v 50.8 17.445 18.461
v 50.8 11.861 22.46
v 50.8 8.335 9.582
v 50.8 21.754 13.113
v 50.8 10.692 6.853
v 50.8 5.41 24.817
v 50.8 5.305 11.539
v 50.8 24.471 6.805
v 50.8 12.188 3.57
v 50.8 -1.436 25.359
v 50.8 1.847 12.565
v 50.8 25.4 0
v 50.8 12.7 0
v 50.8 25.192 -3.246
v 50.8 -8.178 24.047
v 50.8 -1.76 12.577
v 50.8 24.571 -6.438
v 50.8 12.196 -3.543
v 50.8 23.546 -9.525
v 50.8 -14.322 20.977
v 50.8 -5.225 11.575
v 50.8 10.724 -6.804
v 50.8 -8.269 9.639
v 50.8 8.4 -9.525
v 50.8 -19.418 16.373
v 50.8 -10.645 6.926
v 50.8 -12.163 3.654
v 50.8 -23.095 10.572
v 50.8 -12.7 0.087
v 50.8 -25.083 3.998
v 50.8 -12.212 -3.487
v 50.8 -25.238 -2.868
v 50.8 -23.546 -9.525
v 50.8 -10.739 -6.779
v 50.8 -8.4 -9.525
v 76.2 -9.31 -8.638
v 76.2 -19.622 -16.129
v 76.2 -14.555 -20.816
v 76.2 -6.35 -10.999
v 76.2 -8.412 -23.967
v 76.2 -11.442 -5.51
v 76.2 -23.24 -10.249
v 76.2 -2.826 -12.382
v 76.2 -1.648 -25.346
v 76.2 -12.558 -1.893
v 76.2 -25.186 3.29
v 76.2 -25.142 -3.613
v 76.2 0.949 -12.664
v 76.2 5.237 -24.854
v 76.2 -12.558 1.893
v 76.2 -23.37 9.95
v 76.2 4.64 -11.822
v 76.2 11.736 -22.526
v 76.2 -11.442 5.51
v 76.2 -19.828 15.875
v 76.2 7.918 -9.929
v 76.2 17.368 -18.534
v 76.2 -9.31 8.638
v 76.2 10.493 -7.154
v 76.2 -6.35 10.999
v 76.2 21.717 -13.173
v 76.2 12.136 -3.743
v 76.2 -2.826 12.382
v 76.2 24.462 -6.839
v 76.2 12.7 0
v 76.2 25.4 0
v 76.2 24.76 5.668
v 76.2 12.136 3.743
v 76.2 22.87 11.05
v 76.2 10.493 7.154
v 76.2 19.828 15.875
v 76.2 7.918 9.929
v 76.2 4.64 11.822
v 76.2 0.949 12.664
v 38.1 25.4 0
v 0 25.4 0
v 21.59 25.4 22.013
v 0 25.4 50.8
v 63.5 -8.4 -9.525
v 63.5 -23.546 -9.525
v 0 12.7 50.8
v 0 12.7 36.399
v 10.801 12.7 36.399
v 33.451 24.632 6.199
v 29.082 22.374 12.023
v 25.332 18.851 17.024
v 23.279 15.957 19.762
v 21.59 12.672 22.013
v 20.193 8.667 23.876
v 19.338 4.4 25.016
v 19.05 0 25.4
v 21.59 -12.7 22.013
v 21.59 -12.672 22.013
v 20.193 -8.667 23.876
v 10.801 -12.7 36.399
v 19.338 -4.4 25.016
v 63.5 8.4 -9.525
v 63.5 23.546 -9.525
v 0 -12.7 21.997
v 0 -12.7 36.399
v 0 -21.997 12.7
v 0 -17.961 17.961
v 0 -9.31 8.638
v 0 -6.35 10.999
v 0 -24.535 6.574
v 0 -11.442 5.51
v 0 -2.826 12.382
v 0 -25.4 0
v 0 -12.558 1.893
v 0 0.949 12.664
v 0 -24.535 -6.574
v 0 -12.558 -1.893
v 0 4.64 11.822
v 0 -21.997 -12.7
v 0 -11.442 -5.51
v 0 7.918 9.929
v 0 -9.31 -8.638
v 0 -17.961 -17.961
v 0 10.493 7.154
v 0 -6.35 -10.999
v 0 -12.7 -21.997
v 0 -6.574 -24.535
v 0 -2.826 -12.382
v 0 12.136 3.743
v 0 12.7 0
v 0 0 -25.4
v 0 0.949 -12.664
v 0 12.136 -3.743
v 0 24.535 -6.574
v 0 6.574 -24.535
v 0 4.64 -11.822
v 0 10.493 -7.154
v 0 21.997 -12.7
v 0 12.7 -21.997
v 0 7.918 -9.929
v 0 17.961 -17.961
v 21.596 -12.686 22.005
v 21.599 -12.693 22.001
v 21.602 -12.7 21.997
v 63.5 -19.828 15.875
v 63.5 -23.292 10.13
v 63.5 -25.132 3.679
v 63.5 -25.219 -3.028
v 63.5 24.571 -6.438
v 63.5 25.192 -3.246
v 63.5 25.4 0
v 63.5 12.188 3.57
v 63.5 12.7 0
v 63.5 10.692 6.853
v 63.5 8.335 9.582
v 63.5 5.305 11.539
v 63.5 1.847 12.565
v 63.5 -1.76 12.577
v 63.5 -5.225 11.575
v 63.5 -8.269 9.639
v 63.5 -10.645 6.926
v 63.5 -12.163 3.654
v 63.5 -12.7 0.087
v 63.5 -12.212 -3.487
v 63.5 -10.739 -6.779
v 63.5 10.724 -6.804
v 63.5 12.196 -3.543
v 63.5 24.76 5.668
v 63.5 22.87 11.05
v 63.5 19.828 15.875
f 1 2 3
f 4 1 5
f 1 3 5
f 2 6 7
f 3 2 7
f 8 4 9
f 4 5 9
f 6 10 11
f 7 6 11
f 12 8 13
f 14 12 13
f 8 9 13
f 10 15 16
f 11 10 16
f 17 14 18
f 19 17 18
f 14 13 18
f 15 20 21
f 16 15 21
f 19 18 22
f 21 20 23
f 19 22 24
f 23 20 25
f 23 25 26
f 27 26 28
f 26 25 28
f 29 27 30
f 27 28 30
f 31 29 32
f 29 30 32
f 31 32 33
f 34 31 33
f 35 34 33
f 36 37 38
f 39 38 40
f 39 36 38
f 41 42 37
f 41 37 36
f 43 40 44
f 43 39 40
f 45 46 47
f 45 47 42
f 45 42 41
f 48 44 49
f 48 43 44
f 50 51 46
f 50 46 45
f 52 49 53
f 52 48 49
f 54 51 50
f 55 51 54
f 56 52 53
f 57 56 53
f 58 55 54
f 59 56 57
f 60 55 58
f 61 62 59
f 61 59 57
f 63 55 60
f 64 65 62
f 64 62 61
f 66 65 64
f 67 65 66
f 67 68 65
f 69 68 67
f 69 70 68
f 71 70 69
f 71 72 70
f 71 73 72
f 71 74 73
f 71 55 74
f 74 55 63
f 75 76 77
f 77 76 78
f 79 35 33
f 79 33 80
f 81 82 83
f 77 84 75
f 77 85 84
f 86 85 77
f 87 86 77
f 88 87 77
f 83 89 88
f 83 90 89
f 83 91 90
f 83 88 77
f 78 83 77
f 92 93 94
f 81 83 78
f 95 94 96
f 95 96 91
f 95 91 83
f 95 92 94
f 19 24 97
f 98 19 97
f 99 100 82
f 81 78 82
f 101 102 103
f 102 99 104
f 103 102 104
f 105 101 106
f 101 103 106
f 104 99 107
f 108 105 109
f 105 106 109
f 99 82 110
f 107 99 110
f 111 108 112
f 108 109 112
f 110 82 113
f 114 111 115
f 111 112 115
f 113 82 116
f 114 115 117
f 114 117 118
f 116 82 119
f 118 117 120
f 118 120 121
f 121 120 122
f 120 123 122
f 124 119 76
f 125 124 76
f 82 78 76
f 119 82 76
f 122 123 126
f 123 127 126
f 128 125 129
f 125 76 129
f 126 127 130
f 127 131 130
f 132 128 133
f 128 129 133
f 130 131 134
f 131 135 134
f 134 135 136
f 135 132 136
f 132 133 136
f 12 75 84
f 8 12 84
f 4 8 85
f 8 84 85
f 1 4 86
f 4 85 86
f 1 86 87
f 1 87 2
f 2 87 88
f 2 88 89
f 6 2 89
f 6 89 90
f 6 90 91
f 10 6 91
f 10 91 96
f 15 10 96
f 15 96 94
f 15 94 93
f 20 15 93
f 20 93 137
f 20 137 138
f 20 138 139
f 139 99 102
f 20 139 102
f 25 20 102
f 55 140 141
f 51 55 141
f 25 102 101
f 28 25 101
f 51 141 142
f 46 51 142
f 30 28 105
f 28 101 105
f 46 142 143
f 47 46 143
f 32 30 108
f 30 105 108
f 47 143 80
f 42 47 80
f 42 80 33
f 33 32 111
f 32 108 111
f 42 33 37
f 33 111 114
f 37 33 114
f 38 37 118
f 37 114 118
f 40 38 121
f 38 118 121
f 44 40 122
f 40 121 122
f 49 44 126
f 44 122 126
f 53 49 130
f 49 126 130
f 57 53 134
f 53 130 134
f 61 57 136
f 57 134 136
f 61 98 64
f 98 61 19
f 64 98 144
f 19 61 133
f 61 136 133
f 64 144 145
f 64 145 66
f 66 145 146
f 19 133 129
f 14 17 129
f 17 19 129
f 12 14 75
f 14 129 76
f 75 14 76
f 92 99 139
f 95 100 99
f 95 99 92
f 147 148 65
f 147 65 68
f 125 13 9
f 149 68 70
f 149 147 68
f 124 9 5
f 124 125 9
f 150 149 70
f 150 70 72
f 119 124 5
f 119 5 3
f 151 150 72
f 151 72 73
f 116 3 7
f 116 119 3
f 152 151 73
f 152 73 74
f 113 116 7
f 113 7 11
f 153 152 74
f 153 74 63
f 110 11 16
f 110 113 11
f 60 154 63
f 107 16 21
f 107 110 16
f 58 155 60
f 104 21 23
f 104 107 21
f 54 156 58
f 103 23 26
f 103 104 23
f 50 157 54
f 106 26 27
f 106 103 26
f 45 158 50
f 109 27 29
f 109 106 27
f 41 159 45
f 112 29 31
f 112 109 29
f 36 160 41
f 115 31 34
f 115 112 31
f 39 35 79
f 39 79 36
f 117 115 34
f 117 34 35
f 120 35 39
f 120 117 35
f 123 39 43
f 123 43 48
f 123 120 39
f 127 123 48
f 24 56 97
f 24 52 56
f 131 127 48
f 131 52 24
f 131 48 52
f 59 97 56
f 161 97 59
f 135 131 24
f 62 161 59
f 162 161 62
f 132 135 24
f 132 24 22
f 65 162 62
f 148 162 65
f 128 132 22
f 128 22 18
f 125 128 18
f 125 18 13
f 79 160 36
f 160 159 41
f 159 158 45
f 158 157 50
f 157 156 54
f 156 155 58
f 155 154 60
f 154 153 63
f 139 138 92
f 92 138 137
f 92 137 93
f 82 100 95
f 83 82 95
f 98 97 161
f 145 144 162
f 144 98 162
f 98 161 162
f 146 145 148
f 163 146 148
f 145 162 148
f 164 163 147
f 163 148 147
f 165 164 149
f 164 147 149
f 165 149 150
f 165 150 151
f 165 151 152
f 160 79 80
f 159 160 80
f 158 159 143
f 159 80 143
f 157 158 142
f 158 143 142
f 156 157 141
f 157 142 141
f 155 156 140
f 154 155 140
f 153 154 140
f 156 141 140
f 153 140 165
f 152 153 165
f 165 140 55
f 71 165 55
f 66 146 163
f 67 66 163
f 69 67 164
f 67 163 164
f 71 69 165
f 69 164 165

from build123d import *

# Parameters (mm, degrees)
F0_R          = 25.4
F0_R_2        = 12.7
F1_DEPTH      = 76.2
F3_DEPTH      = 25.4
F3_DEPTH_BACK = 12.7
F5_DEPTH      = 25.4
F6_R          = 12.7
F7_DEPTH      = 76.201
F9_DEPTH      = 25.401
F9_DEPTH_BACK = 25.4


with BuildPart() as f1:
    # F0 (on Right) → F1 (new body)
    with BuildSketch(Plane.YZ):
        Circle(F0_R)
        Circle(F0_R_2, mode=Mode.SUBTRACT)
    extrude(amount=F1_DEPTH)

    # F2 (on Front) → F3 (join, two sides)
    with BuildSketch(Plane.XZ) as f3_sk:
        Polygon((0, 22.0133333333), (0, 0), (38.1, 0), (21.59, 22.0133333333), align=None)
        Polygon((0, 50.8), (0, 22.0133333333), (21.59, 22.0133333333), align=None)
    extrude(amount=-F3_DEPTH)
    extrude(f3_sk.sketch, amount=F3_DEPTH_BACK)

    # F4 (on face) → F5 (cut)
    with BuildSketch(Plane.XZ.offset(12.7)):
        Polygon((0, 50.8), (0, 36.3985226281), (10.801108029, 36.3985226281), align=None)
    extrude(amount=-F5_DEPTH, mode=Mode.SUBTRACT)

    # F6 (on Right) → F7 (cut, through all)
    with BuildSketch(Plane.YZ):
        Circle(F6_R)
    extrude(amount=F7_DEPTH, mode=Mode.SUBTRACT)

    # F8 (on Front) → F9 (cut, two sides)
    with BuildSketch(Plane.XZ) as f9_sk:
        Polygon((76.2, 25.4), (50.8, 25.4), (50.8, -9.525), (63.5, -9.525), (63.5, 15.875), (76.2, 15.875), align=None)
    extrude(amount=-F9_DEPTH, mode=Mode.SUBTRACT)
    extrude(f9_sk.sketch, amount=F9_DEPTH_BACK, mode=Mode.SUBTRACT)


solid = f1.part
